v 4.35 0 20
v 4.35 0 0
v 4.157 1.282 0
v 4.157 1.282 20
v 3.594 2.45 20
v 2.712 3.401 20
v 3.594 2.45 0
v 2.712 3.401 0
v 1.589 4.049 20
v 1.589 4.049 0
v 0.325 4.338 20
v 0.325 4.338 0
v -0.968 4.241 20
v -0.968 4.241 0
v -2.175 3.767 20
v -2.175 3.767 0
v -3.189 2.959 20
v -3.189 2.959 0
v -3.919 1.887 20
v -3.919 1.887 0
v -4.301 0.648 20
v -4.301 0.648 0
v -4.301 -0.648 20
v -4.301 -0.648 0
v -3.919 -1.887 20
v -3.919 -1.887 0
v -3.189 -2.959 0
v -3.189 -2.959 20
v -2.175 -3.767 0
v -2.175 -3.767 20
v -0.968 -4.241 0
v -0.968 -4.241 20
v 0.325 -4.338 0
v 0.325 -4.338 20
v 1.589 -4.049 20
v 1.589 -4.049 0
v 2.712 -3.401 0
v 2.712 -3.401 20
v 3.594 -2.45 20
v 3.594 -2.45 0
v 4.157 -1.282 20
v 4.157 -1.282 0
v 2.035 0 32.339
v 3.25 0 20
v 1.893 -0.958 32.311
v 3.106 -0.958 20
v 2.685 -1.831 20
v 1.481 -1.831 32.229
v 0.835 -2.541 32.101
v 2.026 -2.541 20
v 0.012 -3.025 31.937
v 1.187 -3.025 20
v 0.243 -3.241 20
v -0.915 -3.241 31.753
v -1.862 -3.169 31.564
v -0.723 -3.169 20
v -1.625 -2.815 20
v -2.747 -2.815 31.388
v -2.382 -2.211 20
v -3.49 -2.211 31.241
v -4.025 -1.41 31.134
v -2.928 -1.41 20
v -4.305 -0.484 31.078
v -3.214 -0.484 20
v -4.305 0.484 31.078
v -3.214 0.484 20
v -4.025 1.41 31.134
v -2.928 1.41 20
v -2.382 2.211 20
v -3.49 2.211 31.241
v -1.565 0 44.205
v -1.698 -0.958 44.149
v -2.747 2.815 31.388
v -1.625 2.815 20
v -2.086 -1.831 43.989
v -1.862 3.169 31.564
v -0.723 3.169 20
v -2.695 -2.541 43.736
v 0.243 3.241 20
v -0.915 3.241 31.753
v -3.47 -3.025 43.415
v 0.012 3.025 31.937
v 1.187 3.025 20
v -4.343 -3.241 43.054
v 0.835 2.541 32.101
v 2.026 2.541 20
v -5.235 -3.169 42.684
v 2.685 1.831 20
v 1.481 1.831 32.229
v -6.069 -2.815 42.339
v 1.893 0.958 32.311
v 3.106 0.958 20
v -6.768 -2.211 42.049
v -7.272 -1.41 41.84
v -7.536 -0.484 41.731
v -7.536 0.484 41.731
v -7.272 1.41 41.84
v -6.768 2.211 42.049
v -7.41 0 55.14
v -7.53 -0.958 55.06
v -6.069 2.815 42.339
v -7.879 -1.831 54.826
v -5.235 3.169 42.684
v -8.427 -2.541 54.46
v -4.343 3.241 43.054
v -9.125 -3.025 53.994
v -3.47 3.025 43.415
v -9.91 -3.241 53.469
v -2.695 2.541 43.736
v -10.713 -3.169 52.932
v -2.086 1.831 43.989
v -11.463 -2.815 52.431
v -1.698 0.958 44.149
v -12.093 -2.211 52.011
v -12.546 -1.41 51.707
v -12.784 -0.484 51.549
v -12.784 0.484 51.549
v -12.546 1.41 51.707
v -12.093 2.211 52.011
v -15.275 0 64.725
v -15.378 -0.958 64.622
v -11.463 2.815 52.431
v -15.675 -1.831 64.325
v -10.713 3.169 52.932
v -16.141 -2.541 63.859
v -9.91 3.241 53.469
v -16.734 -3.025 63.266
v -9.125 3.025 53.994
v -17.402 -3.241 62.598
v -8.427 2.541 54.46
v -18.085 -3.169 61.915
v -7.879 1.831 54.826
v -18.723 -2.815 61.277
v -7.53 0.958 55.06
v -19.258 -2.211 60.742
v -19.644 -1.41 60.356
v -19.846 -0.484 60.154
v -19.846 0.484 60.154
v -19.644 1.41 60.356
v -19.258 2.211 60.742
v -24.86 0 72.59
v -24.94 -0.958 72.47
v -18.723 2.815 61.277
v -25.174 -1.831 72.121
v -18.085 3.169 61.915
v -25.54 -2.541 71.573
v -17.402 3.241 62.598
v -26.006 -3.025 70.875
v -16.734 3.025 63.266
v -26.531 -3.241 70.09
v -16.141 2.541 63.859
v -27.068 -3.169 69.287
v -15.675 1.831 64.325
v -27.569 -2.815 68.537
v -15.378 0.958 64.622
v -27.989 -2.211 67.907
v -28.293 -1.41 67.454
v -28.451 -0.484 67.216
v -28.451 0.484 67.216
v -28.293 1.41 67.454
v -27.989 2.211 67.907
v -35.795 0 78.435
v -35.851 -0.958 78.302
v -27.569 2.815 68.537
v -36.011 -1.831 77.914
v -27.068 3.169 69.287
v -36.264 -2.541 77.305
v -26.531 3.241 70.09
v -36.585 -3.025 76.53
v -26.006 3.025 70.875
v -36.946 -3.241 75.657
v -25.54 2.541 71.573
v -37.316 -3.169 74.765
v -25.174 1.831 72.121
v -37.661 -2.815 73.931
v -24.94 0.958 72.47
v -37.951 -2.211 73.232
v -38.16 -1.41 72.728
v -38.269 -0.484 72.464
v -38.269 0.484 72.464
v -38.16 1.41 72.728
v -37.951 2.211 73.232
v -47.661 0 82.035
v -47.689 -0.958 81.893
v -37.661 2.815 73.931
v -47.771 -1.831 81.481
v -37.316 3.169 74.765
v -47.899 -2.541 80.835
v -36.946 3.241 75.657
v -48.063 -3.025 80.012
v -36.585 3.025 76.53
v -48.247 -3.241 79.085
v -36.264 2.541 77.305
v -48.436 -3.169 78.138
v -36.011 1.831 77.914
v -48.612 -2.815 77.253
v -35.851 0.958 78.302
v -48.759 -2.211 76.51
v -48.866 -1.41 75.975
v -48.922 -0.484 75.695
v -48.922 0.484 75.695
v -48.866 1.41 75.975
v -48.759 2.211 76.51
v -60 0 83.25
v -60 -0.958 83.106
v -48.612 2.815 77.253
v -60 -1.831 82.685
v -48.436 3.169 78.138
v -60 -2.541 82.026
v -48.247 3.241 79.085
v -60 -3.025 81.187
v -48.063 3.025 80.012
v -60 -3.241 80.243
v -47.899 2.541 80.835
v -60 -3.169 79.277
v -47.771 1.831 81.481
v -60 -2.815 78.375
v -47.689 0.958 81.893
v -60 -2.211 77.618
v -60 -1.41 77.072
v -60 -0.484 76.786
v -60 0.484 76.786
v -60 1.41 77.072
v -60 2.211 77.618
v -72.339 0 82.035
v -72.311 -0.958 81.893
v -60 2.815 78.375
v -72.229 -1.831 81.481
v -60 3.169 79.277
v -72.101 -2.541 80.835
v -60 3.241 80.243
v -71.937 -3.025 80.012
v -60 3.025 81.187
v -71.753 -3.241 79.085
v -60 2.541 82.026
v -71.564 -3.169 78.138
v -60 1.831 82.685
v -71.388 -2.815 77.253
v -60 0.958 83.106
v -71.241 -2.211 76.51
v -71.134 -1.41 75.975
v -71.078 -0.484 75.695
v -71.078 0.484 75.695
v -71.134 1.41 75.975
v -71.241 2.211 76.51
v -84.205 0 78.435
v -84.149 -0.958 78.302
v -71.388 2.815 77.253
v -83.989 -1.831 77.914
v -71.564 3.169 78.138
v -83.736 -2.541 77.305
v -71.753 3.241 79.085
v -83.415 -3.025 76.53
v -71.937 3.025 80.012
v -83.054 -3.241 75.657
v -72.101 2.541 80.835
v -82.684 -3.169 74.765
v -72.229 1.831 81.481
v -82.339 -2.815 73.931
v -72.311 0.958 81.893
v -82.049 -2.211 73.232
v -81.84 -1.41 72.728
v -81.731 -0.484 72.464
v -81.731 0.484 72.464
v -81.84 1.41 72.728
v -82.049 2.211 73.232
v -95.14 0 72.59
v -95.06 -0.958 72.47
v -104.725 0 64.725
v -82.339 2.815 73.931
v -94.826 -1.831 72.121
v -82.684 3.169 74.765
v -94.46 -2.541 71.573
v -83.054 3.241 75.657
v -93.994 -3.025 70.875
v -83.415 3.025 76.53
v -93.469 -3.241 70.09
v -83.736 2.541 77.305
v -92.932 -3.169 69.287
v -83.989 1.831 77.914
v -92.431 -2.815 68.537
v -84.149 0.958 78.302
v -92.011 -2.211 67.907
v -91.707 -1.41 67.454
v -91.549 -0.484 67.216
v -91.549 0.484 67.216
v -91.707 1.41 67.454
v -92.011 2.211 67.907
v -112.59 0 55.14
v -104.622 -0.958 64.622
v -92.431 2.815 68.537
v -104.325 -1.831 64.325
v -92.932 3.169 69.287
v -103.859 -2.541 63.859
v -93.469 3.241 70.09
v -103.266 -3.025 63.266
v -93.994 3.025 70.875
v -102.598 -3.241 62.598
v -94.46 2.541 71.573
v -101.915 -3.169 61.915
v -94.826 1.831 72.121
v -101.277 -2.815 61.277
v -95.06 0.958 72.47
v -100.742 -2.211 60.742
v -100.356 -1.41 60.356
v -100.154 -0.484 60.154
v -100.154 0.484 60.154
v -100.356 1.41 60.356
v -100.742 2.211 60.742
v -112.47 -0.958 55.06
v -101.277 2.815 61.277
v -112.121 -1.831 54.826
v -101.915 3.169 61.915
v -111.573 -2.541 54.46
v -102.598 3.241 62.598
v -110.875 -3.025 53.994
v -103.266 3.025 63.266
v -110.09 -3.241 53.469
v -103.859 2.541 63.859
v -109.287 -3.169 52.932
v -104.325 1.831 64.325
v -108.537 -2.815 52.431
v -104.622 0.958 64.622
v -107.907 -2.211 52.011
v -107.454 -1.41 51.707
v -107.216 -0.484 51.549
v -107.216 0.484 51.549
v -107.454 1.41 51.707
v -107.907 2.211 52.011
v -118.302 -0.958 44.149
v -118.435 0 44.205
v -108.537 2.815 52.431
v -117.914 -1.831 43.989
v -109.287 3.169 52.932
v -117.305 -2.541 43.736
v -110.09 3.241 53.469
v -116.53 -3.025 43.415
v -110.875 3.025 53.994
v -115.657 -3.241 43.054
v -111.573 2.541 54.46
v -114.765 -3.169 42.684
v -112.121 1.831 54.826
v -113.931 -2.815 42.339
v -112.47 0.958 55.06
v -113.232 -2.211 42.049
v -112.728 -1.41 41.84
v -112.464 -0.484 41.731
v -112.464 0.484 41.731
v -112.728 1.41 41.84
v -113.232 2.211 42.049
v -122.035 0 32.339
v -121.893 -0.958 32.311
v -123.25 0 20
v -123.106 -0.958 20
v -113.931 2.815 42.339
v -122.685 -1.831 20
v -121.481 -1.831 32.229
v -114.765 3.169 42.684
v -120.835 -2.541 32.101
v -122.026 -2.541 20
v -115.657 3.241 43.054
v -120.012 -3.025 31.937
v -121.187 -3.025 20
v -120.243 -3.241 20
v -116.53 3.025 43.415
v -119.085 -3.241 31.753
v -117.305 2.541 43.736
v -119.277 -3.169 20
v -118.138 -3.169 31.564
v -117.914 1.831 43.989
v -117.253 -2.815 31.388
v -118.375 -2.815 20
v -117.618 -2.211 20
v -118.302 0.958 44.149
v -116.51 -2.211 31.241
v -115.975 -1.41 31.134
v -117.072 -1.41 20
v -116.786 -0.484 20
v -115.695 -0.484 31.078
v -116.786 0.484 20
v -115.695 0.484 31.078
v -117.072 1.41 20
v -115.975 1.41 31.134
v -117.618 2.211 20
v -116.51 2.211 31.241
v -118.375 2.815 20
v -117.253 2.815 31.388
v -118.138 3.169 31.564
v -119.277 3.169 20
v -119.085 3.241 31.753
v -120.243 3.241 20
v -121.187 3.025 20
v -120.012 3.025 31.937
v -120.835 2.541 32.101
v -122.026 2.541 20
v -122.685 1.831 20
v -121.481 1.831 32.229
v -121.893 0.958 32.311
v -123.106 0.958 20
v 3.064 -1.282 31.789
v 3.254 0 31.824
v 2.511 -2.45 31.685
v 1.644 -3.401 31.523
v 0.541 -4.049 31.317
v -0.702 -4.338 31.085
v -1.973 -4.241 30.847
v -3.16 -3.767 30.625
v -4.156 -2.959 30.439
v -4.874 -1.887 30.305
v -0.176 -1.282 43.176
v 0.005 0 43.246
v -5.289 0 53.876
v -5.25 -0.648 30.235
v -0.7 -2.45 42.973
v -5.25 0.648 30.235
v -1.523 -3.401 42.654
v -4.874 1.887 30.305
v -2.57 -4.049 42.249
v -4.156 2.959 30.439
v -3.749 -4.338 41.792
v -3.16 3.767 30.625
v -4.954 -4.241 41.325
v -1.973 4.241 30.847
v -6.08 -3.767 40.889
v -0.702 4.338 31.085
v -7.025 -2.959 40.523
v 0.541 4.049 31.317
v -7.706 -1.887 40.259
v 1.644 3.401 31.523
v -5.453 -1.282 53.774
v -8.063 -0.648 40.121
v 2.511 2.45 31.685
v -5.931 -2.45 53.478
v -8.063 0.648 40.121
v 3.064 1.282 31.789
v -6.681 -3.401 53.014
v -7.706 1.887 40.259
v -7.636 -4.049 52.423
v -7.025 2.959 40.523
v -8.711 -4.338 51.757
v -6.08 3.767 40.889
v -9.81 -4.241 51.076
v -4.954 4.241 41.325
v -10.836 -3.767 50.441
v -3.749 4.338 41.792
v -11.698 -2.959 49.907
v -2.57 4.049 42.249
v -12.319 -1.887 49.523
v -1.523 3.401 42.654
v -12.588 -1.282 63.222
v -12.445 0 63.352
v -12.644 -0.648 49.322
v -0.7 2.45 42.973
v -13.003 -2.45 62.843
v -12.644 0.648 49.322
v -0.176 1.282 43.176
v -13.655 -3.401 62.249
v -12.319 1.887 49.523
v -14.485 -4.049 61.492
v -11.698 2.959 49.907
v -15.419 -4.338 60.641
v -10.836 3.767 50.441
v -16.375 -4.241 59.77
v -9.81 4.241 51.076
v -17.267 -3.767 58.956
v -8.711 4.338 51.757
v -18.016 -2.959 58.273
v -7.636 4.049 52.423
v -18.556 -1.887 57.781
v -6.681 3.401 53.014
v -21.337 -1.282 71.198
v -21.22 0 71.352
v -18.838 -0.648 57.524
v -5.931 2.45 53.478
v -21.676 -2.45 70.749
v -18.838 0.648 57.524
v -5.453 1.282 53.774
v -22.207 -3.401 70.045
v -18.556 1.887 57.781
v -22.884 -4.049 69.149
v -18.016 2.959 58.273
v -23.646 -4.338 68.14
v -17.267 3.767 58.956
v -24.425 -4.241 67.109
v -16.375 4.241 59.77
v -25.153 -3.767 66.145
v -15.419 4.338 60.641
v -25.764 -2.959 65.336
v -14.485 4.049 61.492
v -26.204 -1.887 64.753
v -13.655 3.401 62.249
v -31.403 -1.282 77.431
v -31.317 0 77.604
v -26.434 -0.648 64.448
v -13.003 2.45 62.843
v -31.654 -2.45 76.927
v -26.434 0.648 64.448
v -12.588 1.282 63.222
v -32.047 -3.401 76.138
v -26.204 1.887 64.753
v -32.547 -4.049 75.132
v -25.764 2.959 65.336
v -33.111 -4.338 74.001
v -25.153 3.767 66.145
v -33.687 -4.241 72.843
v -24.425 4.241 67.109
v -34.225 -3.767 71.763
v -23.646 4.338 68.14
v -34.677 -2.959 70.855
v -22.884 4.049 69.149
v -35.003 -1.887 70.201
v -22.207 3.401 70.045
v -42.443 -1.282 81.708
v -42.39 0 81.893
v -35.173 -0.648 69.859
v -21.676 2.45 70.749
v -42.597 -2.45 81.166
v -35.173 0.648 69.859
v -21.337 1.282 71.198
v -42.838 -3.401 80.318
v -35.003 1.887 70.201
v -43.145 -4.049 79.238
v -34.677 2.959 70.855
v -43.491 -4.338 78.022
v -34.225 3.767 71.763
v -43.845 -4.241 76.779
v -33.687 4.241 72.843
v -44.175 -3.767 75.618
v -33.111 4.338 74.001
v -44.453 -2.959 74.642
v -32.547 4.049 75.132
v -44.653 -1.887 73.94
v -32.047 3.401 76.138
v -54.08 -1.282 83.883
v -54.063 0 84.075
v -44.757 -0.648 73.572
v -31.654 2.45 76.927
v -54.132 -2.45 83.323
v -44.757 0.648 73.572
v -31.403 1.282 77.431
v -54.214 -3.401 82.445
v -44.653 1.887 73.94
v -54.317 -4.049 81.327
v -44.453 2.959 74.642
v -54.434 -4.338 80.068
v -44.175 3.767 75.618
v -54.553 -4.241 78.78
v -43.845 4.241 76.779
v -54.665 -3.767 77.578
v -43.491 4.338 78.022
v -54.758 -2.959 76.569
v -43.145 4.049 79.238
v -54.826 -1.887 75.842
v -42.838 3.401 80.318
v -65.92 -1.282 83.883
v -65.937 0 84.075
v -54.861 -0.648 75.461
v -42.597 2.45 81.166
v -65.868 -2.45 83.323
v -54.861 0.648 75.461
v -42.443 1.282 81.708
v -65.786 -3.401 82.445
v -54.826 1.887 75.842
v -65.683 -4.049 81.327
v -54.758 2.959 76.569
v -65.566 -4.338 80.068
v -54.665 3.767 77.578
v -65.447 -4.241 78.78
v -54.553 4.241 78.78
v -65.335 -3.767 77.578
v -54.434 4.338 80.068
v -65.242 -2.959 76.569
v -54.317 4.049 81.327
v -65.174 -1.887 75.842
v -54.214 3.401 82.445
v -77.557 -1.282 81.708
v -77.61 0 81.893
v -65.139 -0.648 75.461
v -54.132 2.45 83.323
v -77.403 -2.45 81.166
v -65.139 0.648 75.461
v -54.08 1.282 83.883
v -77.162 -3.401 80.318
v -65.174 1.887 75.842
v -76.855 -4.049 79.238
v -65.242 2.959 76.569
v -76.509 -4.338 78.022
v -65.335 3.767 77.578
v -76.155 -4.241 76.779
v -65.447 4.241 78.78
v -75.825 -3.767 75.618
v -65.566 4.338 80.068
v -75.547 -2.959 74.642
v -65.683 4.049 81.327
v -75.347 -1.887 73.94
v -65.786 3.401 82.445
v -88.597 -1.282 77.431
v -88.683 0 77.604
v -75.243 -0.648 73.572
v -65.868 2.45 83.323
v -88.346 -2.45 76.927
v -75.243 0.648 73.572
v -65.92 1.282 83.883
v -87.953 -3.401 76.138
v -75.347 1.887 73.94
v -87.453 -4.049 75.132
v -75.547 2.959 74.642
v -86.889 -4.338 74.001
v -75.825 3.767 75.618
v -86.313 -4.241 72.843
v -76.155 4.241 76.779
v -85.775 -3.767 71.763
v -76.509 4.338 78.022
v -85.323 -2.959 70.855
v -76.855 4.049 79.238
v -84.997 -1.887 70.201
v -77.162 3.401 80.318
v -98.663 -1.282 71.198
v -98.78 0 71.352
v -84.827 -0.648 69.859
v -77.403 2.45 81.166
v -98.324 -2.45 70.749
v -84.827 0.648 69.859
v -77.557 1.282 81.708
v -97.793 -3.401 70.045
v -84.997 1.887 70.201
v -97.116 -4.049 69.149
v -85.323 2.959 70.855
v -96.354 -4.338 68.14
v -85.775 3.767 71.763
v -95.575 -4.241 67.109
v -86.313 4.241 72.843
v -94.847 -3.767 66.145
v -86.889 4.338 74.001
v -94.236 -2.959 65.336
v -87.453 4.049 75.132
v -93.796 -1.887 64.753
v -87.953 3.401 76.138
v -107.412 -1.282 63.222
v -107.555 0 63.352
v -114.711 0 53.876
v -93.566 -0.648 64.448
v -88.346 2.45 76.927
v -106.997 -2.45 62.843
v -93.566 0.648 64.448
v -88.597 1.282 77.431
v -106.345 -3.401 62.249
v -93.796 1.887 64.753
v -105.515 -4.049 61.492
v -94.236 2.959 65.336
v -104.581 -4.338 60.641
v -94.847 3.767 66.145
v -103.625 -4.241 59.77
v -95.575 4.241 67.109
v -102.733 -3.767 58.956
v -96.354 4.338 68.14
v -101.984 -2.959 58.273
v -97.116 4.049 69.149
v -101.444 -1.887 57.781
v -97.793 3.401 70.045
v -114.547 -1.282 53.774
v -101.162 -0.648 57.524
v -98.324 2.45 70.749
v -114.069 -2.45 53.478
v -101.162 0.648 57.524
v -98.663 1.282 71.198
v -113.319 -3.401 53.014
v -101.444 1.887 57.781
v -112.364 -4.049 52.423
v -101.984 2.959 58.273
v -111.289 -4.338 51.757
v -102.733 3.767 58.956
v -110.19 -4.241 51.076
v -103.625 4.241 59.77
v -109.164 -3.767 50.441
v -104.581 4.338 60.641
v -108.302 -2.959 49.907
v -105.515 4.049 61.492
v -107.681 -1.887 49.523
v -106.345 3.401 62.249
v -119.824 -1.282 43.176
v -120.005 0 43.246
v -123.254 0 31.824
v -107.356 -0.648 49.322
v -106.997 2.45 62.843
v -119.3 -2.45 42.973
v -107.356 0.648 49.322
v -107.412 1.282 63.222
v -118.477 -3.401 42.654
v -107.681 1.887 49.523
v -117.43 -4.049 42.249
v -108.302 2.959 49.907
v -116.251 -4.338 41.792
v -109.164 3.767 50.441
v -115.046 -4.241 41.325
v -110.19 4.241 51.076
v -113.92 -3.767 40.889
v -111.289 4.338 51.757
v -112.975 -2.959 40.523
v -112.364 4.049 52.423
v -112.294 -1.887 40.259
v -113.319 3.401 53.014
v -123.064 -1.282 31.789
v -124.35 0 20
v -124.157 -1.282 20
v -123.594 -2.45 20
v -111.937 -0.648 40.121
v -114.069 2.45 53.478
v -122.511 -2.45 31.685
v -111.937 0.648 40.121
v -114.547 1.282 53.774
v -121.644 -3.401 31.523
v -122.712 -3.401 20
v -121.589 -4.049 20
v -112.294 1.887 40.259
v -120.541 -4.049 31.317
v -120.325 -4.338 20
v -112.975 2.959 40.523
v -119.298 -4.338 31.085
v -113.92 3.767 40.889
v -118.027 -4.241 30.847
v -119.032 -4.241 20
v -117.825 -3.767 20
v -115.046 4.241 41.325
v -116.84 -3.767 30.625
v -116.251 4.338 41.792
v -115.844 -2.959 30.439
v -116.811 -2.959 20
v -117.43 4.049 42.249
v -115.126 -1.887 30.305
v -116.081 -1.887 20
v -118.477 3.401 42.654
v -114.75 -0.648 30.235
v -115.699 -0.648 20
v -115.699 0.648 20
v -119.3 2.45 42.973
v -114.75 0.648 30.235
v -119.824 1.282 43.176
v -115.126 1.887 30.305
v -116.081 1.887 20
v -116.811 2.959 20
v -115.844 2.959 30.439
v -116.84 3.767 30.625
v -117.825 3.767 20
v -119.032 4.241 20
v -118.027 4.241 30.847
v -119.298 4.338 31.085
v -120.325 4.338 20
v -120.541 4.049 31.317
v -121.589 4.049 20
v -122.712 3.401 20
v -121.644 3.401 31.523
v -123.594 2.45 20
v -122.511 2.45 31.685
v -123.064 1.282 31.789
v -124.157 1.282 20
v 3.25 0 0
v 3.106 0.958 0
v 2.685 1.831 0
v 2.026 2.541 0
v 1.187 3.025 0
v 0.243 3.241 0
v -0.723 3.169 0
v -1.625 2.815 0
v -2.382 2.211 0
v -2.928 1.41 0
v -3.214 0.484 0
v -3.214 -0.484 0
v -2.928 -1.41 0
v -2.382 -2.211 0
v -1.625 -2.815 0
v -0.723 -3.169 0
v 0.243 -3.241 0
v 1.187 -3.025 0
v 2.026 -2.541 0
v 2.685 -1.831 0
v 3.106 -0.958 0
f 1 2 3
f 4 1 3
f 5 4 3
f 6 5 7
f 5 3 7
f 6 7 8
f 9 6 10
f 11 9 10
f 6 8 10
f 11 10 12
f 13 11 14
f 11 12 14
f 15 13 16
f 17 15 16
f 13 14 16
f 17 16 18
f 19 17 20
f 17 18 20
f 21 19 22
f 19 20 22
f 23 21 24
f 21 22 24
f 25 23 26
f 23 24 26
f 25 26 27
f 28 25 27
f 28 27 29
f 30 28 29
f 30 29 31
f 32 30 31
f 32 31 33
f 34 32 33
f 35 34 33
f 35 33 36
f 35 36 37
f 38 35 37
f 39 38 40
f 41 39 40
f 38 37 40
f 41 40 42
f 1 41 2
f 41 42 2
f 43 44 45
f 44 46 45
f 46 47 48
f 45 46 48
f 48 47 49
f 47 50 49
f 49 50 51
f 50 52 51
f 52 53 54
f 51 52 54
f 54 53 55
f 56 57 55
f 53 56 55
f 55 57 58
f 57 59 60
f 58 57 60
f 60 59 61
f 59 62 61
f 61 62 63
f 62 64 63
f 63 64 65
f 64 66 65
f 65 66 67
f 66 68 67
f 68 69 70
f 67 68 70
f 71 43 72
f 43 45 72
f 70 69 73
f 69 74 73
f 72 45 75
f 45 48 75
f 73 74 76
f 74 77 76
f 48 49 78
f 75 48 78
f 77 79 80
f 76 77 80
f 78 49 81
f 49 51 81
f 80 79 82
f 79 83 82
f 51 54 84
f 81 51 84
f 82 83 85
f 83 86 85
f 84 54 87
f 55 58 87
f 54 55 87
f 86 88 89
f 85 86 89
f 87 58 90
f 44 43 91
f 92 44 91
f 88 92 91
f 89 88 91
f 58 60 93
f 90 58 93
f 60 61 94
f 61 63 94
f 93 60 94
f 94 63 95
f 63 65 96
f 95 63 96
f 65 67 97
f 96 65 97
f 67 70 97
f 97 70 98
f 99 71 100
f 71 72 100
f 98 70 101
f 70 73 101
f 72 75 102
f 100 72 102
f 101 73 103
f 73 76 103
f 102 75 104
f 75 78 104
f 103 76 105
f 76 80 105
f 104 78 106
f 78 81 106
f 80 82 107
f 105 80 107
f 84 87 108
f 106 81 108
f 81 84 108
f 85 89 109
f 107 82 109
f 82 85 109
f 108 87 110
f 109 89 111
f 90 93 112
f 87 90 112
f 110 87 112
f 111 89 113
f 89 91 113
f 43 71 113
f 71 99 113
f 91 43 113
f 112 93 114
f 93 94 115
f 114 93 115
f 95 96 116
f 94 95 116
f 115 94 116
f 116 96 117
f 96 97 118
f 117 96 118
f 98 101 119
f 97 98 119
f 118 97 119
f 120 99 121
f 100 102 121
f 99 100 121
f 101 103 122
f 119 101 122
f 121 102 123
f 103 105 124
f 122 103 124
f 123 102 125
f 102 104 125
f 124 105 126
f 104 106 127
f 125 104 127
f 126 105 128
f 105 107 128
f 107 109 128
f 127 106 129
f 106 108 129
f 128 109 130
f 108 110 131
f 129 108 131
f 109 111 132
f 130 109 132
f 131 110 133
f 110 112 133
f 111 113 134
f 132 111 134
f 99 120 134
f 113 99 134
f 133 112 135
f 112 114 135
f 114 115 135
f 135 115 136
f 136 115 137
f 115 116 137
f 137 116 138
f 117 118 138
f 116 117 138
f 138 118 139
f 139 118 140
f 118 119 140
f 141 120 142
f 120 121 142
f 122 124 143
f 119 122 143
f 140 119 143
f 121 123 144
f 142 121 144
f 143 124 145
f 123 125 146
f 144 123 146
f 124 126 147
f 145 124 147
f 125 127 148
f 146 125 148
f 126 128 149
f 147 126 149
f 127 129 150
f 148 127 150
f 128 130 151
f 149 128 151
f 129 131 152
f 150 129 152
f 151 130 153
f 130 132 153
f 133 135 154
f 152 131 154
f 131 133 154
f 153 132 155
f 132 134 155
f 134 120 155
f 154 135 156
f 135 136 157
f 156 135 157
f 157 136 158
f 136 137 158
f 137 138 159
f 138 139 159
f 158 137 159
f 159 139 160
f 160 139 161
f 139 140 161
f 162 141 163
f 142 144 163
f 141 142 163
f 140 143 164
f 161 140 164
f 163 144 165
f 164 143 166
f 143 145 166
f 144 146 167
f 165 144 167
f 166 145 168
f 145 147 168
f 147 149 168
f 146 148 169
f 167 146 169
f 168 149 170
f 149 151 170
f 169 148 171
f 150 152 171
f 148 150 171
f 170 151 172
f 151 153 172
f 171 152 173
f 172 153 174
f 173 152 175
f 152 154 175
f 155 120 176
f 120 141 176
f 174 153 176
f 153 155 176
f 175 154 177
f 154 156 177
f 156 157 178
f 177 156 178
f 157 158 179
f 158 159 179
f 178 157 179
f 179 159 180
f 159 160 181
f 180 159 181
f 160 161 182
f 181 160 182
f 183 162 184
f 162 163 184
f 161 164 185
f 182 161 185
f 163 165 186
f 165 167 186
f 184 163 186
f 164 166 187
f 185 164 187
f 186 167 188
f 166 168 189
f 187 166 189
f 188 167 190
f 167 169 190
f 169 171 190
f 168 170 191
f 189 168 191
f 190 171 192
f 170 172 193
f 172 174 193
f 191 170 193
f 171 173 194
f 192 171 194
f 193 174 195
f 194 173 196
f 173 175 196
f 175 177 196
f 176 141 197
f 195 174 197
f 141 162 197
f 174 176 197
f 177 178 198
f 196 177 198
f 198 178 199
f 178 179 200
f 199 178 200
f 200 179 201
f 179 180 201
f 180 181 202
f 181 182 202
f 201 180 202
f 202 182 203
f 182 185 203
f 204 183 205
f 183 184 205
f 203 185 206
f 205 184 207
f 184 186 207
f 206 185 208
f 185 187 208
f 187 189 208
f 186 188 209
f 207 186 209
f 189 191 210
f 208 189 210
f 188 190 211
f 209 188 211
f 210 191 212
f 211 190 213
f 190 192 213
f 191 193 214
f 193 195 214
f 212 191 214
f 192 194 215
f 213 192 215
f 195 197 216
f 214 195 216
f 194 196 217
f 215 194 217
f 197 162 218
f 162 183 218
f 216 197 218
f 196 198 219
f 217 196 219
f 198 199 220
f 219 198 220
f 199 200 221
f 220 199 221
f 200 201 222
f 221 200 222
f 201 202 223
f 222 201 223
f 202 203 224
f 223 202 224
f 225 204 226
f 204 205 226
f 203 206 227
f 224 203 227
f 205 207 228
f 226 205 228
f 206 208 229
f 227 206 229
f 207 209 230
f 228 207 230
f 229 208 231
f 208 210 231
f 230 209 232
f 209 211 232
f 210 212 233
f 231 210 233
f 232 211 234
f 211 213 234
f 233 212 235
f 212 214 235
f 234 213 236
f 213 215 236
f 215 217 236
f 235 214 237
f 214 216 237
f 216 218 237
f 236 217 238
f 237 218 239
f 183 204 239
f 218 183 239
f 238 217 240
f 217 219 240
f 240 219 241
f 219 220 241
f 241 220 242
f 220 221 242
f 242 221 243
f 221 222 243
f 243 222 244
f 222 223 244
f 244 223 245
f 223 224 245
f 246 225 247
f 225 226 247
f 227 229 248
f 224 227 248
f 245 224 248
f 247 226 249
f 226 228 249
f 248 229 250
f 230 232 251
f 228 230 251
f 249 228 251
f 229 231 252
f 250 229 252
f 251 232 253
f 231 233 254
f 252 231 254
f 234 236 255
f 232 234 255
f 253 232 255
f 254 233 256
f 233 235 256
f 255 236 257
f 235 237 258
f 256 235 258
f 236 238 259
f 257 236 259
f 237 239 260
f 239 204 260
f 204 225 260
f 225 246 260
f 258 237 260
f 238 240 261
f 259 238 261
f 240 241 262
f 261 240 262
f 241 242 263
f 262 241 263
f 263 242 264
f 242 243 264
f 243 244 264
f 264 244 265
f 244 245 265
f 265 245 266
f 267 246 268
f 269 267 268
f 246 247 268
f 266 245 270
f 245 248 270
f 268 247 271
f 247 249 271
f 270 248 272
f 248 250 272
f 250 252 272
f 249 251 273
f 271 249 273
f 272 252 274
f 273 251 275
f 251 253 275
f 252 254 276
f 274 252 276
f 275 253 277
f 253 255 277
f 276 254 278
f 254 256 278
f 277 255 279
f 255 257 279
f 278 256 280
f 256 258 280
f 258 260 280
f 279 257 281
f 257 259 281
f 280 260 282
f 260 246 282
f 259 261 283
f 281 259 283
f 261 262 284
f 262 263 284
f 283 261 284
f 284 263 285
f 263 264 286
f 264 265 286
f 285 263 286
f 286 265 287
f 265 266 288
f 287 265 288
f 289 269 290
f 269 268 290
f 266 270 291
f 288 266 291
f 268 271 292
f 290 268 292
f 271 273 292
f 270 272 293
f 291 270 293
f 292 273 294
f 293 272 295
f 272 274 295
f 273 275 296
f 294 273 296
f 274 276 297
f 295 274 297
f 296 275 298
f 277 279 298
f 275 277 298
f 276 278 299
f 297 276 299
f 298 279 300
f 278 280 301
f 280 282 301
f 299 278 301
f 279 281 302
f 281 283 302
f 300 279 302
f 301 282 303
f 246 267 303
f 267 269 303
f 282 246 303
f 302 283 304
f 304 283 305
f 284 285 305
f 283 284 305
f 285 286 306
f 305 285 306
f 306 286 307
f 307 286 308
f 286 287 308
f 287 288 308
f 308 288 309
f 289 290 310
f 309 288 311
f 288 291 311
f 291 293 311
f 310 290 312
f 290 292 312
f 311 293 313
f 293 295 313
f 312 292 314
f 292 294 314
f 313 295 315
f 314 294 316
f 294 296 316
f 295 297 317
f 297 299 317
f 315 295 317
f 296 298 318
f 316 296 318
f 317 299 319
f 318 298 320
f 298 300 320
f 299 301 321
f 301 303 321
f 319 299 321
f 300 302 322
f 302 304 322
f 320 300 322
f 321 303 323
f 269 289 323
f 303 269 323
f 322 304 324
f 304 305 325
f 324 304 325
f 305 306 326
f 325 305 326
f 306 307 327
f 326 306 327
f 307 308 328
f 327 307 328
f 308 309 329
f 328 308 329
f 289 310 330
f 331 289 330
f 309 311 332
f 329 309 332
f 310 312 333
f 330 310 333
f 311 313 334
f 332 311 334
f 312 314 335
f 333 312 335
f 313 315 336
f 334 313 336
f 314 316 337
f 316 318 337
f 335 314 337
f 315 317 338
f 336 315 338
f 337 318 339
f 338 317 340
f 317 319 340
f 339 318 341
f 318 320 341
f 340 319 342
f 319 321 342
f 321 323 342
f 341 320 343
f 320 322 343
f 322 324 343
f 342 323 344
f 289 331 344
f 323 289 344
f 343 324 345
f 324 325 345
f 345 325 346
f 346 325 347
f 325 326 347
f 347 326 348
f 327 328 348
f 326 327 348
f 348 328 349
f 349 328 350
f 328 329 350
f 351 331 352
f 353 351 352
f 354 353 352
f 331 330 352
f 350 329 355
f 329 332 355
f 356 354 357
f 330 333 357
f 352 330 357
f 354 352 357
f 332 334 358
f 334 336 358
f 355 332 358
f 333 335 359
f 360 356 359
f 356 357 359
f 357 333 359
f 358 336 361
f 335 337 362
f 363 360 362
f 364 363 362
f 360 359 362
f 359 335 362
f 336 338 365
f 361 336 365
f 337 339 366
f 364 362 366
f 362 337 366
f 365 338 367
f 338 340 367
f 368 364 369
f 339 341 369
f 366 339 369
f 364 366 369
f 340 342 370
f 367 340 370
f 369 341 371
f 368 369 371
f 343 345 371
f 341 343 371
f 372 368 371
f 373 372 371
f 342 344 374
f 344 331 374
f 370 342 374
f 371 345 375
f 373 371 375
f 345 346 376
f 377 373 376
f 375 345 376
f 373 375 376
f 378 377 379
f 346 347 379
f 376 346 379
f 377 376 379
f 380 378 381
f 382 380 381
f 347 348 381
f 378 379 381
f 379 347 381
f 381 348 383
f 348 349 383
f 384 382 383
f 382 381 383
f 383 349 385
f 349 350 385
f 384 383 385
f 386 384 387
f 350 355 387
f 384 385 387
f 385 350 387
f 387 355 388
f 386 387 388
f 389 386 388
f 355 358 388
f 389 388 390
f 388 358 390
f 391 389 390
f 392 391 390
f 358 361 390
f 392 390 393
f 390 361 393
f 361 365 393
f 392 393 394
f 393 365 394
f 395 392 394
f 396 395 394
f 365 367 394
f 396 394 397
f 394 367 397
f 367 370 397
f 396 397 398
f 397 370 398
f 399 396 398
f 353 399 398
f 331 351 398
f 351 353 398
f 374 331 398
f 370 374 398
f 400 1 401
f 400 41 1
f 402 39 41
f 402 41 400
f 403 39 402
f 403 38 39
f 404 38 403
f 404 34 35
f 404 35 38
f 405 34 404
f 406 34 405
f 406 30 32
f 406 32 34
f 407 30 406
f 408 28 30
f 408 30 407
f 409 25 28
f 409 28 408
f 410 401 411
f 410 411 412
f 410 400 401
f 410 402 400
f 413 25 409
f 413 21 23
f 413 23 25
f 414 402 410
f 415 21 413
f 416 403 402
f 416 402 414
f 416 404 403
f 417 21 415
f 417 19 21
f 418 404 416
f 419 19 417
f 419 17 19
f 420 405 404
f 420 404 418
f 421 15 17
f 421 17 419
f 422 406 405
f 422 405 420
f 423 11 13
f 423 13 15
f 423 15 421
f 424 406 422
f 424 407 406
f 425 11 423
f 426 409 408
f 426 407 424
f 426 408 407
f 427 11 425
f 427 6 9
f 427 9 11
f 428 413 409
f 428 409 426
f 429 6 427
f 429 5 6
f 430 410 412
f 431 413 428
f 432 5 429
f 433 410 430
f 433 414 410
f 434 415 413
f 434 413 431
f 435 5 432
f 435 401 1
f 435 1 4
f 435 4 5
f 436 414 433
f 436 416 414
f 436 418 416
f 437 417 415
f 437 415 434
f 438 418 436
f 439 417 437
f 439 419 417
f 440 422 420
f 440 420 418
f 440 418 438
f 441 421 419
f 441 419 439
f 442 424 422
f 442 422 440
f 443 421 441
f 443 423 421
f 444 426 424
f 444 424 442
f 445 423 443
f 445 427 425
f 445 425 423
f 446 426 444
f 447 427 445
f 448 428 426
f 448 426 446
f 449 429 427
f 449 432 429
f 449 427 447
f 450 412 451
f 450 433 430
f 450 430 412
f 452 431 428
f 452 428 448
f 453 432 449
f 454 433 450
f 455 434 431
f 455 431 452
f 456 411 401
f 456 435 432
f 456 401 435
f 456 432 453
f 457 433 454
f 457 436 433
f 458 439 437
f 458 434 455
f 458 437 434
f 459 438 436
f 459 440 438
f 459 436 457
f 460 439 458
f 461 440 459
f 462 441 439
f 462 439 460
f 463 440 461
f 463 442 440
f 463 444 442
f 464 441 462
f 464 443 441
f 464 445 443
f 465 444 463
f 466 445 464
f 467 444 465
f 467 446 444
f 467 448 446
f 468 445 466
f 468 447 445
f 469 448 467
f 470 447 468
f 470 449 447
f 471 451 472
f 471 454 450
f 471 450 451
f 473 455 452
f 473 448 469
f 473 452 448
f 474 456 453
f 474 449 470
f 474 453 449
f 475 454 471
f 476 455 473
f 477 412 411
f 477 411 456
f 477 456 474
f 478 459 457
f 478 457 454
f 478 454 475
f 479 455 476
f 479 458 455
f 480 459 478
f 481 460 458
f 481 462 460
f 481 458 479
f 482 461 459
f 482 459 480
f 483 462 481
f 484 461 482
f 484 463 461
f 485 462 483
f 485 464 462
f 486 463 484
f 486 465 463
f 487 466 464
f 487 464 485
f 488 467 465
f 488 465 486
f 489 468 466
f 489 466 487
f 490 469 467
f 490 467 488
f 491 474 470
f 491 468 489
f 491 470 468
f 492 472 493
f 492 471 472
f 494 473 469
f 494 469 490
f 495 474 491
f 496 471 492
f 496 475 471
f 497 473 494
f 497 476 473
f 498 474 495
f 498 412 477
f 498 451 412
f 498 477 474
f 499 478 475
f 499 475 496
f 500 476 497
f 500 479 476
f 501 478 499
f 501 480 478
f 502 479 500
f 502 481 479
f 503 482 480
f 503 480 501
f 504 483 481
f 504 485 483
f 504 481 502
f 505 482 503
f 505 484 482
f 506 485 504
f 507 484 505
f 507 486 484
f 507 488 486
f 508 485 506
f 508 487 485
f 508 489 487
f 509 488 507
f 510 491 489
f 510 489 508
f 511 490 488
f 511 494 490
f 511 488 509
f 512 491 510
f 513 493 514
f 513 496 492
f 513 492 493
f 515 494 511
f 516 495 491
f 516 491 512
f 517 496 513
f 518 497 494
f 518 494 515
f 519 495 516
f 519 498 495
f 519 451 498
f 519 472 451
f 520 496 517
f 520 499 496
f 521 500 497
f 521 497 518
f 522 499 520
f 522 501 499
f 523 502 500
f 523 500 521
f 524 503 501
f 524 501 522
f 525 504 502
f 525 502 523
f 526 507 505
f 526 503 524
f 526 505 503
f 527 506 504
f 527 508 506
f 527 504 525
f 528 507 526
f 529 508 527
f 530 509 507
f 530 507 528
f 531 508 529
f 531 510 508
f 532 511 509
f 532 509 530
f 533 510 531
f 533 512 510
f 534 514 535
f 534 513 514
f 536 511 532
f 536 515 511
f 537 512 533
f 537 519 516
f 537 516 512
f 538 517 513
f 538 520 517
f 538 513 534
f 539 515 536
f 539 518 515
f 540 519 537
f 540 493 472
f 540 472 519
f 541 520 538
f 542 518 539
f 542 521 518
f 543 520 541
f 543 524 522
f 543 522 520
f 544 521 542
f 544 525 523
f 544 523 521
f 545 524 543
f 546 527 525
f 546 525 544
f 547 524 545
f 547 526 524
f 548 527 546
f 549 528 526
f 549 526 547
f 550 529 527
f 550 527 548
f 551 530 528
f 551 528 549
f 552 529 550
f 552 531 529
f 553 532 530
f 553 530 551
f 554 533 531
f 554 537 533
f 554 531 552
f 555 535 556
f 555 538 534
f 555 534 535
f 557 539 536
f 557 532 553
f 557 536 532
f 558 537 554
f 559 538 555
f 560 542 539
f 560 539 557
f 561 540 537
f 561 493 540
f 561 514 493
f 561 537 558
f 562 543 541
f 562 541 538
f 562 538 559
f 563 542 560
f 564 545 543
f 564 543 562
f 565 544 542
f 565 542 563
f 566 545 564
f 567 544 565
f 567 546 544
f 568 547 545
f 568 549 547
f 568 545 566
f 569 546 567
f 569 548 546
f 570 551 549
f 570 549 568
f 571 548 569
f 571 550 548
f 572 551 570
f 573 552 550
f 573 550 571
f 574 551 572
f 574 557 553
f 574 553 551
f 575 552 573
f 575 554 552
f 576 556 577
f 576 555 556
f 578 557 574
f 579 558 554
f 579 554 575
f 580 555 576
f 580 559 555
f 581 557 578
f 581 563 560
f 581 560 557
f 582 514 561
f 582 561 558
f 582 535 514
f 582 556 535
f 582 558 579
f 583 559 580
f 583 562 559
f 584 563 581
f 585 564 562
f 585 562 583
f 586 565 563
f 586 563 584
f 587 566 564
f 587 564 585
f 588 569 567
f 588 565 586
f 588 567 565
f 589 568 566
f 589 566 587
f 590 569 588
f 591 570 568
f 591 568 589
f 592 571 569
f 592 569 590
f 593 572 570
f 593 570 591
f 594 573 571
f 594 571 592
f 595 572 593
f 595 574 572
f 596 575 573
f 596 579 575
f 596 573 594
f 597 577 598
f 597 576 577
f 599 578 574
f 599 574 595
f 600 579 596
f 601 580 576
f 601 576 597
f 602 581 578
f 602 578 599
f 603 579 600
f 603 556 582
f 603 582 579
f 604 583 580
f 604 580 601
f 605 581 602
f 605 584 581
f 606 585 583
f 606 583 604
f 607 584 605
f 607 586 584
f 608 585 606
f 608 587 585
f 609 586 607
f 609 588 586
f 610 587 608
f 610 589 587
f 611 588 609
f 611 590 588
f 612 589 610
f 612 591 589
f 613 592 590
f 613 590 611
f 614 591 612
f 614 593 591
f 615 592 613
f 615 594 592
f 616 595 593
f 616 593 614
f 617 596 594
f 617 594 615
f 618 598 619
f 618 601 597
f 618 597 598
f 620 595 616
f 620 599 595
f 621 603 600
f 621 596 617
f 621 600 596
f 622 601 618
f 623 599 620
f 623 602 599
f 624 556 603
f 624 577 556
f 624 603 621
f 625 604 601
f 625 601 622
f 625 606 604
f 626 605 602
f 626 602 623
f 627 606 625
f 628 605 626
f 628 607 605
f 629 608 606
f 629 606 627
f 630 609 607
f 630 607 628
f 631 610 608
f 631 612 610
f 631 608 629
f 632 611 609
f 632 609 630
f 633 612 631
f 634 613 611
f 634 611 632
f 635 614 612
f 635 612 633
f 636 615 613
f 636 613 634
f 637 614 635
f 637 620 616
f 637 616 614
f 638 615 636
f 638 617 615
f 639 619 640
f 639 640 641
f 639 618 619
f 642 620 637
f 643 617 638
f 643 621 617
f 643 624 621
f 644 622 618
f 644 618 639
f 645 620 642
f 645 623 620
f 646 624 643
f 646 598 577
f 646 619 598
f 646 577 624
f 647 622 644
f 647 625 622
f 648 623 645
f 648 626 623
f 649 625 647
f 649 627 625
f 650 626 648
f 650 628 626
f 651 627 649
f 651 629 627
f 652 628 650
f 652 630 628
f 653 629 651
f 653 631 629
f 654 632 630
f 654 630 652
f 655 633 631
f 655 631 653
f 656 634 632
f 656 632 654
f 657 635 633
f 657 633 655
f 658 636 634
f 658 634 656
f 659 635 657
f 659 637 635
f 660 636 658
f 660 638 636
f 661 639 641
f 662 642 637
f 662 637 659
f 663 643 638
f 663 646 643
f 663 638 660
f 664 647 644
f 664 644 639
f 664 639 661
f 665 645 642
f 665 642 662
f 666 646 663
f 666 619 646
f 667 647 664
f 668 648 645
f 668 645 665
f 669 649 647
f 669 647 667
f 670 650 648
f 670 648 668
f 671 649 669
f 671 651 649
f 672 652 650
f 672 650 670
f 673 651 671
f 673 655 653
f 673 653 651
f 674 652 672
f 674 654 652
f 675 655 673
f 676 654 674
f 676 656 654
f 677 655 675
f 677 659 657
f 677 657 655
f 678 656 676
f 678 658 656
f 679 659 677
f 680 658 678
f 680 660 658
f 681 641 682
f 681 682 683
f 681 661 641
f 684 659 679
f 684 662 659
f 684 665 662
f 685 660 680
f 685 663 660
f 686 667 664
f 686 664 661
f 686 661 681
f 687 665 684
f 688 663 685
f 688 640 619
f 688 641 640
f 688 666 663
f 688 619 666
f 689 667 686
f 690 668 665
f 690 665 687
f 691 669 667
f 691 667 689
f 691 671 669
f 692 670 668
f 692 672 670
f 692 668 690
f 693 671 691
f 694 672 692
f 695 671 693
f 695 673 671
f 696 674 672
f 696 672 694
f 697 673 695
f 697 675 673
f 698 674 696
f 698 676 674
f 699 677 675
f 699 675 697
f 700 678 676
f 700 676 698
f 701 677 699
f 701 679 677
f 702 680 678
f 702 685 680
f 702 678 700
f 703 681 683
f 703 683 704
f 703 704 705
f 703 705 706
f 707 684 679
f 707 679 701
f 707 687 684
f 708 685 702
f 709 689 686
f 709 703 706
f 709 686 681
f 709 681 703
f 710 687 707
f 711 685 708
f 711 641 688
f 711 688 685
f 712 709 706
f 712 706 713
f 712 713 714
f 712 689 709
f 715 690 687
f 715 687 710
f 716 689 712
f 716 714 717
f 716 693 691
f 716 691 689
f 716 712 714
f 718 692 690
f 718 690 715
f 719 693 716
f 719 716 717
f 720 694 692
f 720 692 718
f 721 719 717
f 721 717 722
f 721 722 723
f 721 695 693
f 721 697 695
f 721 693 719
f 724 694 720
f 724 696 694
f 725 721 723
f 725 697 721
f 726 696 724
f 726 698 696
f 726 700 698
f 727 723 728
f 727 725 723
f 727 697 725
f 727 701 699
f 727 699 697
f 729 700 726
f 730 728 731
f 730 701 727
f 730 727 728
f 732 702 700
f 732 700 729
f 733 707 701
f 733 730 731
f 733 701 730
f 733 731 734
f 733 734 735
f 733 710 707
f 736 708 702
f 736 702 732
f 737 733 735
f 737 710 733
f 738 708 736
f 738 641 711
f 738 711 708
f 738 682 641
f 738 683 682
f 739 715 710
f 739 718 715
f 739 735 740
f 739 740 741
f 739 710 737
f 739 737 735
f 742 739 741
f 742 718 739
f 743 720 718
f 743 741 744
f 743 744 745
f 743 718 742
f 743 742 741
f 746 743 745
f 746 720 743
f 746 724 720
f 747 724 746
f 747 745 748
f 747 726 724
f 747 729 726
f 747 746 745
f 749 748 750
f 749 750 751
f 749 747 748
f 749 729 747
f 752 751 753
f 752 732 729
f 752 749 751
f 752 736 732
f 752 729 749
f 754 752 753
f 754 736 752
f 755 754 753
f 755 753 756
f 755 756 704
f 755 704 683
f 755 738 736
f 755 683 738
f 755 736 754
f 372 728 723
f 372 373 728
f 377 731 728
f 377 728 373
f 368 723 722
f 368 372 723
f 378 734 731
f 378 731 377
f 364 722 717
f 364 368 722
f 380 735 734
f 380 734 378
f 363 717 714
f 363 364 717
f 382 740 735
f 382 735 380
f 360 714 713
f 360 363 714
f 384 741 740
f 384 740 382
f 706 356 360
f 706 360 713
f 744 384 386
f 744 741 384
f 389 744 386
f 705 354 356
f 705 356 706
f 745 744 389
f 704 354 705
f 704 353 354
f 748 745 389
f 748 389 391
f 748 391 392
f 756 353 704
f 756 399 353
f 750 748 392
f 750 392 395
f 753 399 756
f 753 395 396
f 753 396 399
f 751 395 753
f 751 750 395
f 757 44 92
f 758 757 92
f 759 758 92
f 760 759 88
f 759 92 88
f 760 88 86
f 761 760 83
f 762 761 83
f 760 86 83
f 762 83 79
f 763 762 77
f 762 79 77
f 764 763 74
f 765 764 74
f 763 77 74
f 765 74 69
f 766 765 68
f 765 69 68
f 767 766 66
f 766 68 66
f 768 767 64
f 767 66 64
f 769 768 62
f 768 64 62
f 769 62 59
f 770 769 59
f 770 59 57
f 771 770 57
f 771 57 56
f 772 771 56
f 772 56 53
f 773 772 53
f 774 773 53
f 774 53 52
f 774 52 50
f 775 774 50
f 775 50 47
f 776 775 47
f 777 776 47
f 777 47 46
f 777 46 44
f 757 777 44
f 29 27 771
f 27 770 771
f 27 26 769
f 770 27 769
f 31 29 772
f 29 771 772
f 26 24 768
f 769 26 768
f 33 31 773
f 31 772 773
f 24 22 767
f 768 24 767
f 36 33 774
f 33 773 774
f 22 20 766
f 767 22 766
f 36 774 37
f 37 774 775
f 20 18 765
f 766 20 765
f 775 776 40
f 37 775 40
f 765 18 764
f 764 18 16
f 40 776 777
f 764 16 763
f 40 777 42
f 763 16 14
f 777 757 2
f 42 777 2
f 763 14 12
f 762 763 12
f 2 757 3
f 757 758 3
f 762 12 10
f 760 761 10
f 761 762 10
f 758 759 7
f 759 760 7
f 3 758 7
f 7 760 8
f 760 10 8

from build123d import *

# Parameters (mm, degrees)
F0_R        = 4.35
F1_DEPTH    = 20
F2_R        = 3.25
F3_DEPTH    = 25
F1_FACE_R   = 4.35
F1_FACE_R_2 = 3.25


with BuildPart() as f1:
    # F0 (on Top) → F1 (new body)
    with BuildSketch(Plane.XY):
        Circle(F0_R)
    extrude(amount=F1_DEPTH)

    # F2 (on face) → F3 (cut)
    with BuildSketch(Plane.XY.offset(20)):
        Circle(F2_R)
    extrude(amount=-F3_DEPTH, mode=Mode.SUBTRACT)

    # F5: sweep along a path in F4
    with BuildLine(Plane.XZ) as f5_path:
        ThreePointArc((0, 20), (-60, 80), (-120, 20))
    # F1_face (on face) → F5 (sweep)
    with BuildSketch(Plane.XY.offset(20)):
        Circle(F1_FACE_R)
        Circle(F1_FACE_R_2, mode=Mode.SUBTRACT)
    sweep(path=f5_path.line)


solid = f1.part
